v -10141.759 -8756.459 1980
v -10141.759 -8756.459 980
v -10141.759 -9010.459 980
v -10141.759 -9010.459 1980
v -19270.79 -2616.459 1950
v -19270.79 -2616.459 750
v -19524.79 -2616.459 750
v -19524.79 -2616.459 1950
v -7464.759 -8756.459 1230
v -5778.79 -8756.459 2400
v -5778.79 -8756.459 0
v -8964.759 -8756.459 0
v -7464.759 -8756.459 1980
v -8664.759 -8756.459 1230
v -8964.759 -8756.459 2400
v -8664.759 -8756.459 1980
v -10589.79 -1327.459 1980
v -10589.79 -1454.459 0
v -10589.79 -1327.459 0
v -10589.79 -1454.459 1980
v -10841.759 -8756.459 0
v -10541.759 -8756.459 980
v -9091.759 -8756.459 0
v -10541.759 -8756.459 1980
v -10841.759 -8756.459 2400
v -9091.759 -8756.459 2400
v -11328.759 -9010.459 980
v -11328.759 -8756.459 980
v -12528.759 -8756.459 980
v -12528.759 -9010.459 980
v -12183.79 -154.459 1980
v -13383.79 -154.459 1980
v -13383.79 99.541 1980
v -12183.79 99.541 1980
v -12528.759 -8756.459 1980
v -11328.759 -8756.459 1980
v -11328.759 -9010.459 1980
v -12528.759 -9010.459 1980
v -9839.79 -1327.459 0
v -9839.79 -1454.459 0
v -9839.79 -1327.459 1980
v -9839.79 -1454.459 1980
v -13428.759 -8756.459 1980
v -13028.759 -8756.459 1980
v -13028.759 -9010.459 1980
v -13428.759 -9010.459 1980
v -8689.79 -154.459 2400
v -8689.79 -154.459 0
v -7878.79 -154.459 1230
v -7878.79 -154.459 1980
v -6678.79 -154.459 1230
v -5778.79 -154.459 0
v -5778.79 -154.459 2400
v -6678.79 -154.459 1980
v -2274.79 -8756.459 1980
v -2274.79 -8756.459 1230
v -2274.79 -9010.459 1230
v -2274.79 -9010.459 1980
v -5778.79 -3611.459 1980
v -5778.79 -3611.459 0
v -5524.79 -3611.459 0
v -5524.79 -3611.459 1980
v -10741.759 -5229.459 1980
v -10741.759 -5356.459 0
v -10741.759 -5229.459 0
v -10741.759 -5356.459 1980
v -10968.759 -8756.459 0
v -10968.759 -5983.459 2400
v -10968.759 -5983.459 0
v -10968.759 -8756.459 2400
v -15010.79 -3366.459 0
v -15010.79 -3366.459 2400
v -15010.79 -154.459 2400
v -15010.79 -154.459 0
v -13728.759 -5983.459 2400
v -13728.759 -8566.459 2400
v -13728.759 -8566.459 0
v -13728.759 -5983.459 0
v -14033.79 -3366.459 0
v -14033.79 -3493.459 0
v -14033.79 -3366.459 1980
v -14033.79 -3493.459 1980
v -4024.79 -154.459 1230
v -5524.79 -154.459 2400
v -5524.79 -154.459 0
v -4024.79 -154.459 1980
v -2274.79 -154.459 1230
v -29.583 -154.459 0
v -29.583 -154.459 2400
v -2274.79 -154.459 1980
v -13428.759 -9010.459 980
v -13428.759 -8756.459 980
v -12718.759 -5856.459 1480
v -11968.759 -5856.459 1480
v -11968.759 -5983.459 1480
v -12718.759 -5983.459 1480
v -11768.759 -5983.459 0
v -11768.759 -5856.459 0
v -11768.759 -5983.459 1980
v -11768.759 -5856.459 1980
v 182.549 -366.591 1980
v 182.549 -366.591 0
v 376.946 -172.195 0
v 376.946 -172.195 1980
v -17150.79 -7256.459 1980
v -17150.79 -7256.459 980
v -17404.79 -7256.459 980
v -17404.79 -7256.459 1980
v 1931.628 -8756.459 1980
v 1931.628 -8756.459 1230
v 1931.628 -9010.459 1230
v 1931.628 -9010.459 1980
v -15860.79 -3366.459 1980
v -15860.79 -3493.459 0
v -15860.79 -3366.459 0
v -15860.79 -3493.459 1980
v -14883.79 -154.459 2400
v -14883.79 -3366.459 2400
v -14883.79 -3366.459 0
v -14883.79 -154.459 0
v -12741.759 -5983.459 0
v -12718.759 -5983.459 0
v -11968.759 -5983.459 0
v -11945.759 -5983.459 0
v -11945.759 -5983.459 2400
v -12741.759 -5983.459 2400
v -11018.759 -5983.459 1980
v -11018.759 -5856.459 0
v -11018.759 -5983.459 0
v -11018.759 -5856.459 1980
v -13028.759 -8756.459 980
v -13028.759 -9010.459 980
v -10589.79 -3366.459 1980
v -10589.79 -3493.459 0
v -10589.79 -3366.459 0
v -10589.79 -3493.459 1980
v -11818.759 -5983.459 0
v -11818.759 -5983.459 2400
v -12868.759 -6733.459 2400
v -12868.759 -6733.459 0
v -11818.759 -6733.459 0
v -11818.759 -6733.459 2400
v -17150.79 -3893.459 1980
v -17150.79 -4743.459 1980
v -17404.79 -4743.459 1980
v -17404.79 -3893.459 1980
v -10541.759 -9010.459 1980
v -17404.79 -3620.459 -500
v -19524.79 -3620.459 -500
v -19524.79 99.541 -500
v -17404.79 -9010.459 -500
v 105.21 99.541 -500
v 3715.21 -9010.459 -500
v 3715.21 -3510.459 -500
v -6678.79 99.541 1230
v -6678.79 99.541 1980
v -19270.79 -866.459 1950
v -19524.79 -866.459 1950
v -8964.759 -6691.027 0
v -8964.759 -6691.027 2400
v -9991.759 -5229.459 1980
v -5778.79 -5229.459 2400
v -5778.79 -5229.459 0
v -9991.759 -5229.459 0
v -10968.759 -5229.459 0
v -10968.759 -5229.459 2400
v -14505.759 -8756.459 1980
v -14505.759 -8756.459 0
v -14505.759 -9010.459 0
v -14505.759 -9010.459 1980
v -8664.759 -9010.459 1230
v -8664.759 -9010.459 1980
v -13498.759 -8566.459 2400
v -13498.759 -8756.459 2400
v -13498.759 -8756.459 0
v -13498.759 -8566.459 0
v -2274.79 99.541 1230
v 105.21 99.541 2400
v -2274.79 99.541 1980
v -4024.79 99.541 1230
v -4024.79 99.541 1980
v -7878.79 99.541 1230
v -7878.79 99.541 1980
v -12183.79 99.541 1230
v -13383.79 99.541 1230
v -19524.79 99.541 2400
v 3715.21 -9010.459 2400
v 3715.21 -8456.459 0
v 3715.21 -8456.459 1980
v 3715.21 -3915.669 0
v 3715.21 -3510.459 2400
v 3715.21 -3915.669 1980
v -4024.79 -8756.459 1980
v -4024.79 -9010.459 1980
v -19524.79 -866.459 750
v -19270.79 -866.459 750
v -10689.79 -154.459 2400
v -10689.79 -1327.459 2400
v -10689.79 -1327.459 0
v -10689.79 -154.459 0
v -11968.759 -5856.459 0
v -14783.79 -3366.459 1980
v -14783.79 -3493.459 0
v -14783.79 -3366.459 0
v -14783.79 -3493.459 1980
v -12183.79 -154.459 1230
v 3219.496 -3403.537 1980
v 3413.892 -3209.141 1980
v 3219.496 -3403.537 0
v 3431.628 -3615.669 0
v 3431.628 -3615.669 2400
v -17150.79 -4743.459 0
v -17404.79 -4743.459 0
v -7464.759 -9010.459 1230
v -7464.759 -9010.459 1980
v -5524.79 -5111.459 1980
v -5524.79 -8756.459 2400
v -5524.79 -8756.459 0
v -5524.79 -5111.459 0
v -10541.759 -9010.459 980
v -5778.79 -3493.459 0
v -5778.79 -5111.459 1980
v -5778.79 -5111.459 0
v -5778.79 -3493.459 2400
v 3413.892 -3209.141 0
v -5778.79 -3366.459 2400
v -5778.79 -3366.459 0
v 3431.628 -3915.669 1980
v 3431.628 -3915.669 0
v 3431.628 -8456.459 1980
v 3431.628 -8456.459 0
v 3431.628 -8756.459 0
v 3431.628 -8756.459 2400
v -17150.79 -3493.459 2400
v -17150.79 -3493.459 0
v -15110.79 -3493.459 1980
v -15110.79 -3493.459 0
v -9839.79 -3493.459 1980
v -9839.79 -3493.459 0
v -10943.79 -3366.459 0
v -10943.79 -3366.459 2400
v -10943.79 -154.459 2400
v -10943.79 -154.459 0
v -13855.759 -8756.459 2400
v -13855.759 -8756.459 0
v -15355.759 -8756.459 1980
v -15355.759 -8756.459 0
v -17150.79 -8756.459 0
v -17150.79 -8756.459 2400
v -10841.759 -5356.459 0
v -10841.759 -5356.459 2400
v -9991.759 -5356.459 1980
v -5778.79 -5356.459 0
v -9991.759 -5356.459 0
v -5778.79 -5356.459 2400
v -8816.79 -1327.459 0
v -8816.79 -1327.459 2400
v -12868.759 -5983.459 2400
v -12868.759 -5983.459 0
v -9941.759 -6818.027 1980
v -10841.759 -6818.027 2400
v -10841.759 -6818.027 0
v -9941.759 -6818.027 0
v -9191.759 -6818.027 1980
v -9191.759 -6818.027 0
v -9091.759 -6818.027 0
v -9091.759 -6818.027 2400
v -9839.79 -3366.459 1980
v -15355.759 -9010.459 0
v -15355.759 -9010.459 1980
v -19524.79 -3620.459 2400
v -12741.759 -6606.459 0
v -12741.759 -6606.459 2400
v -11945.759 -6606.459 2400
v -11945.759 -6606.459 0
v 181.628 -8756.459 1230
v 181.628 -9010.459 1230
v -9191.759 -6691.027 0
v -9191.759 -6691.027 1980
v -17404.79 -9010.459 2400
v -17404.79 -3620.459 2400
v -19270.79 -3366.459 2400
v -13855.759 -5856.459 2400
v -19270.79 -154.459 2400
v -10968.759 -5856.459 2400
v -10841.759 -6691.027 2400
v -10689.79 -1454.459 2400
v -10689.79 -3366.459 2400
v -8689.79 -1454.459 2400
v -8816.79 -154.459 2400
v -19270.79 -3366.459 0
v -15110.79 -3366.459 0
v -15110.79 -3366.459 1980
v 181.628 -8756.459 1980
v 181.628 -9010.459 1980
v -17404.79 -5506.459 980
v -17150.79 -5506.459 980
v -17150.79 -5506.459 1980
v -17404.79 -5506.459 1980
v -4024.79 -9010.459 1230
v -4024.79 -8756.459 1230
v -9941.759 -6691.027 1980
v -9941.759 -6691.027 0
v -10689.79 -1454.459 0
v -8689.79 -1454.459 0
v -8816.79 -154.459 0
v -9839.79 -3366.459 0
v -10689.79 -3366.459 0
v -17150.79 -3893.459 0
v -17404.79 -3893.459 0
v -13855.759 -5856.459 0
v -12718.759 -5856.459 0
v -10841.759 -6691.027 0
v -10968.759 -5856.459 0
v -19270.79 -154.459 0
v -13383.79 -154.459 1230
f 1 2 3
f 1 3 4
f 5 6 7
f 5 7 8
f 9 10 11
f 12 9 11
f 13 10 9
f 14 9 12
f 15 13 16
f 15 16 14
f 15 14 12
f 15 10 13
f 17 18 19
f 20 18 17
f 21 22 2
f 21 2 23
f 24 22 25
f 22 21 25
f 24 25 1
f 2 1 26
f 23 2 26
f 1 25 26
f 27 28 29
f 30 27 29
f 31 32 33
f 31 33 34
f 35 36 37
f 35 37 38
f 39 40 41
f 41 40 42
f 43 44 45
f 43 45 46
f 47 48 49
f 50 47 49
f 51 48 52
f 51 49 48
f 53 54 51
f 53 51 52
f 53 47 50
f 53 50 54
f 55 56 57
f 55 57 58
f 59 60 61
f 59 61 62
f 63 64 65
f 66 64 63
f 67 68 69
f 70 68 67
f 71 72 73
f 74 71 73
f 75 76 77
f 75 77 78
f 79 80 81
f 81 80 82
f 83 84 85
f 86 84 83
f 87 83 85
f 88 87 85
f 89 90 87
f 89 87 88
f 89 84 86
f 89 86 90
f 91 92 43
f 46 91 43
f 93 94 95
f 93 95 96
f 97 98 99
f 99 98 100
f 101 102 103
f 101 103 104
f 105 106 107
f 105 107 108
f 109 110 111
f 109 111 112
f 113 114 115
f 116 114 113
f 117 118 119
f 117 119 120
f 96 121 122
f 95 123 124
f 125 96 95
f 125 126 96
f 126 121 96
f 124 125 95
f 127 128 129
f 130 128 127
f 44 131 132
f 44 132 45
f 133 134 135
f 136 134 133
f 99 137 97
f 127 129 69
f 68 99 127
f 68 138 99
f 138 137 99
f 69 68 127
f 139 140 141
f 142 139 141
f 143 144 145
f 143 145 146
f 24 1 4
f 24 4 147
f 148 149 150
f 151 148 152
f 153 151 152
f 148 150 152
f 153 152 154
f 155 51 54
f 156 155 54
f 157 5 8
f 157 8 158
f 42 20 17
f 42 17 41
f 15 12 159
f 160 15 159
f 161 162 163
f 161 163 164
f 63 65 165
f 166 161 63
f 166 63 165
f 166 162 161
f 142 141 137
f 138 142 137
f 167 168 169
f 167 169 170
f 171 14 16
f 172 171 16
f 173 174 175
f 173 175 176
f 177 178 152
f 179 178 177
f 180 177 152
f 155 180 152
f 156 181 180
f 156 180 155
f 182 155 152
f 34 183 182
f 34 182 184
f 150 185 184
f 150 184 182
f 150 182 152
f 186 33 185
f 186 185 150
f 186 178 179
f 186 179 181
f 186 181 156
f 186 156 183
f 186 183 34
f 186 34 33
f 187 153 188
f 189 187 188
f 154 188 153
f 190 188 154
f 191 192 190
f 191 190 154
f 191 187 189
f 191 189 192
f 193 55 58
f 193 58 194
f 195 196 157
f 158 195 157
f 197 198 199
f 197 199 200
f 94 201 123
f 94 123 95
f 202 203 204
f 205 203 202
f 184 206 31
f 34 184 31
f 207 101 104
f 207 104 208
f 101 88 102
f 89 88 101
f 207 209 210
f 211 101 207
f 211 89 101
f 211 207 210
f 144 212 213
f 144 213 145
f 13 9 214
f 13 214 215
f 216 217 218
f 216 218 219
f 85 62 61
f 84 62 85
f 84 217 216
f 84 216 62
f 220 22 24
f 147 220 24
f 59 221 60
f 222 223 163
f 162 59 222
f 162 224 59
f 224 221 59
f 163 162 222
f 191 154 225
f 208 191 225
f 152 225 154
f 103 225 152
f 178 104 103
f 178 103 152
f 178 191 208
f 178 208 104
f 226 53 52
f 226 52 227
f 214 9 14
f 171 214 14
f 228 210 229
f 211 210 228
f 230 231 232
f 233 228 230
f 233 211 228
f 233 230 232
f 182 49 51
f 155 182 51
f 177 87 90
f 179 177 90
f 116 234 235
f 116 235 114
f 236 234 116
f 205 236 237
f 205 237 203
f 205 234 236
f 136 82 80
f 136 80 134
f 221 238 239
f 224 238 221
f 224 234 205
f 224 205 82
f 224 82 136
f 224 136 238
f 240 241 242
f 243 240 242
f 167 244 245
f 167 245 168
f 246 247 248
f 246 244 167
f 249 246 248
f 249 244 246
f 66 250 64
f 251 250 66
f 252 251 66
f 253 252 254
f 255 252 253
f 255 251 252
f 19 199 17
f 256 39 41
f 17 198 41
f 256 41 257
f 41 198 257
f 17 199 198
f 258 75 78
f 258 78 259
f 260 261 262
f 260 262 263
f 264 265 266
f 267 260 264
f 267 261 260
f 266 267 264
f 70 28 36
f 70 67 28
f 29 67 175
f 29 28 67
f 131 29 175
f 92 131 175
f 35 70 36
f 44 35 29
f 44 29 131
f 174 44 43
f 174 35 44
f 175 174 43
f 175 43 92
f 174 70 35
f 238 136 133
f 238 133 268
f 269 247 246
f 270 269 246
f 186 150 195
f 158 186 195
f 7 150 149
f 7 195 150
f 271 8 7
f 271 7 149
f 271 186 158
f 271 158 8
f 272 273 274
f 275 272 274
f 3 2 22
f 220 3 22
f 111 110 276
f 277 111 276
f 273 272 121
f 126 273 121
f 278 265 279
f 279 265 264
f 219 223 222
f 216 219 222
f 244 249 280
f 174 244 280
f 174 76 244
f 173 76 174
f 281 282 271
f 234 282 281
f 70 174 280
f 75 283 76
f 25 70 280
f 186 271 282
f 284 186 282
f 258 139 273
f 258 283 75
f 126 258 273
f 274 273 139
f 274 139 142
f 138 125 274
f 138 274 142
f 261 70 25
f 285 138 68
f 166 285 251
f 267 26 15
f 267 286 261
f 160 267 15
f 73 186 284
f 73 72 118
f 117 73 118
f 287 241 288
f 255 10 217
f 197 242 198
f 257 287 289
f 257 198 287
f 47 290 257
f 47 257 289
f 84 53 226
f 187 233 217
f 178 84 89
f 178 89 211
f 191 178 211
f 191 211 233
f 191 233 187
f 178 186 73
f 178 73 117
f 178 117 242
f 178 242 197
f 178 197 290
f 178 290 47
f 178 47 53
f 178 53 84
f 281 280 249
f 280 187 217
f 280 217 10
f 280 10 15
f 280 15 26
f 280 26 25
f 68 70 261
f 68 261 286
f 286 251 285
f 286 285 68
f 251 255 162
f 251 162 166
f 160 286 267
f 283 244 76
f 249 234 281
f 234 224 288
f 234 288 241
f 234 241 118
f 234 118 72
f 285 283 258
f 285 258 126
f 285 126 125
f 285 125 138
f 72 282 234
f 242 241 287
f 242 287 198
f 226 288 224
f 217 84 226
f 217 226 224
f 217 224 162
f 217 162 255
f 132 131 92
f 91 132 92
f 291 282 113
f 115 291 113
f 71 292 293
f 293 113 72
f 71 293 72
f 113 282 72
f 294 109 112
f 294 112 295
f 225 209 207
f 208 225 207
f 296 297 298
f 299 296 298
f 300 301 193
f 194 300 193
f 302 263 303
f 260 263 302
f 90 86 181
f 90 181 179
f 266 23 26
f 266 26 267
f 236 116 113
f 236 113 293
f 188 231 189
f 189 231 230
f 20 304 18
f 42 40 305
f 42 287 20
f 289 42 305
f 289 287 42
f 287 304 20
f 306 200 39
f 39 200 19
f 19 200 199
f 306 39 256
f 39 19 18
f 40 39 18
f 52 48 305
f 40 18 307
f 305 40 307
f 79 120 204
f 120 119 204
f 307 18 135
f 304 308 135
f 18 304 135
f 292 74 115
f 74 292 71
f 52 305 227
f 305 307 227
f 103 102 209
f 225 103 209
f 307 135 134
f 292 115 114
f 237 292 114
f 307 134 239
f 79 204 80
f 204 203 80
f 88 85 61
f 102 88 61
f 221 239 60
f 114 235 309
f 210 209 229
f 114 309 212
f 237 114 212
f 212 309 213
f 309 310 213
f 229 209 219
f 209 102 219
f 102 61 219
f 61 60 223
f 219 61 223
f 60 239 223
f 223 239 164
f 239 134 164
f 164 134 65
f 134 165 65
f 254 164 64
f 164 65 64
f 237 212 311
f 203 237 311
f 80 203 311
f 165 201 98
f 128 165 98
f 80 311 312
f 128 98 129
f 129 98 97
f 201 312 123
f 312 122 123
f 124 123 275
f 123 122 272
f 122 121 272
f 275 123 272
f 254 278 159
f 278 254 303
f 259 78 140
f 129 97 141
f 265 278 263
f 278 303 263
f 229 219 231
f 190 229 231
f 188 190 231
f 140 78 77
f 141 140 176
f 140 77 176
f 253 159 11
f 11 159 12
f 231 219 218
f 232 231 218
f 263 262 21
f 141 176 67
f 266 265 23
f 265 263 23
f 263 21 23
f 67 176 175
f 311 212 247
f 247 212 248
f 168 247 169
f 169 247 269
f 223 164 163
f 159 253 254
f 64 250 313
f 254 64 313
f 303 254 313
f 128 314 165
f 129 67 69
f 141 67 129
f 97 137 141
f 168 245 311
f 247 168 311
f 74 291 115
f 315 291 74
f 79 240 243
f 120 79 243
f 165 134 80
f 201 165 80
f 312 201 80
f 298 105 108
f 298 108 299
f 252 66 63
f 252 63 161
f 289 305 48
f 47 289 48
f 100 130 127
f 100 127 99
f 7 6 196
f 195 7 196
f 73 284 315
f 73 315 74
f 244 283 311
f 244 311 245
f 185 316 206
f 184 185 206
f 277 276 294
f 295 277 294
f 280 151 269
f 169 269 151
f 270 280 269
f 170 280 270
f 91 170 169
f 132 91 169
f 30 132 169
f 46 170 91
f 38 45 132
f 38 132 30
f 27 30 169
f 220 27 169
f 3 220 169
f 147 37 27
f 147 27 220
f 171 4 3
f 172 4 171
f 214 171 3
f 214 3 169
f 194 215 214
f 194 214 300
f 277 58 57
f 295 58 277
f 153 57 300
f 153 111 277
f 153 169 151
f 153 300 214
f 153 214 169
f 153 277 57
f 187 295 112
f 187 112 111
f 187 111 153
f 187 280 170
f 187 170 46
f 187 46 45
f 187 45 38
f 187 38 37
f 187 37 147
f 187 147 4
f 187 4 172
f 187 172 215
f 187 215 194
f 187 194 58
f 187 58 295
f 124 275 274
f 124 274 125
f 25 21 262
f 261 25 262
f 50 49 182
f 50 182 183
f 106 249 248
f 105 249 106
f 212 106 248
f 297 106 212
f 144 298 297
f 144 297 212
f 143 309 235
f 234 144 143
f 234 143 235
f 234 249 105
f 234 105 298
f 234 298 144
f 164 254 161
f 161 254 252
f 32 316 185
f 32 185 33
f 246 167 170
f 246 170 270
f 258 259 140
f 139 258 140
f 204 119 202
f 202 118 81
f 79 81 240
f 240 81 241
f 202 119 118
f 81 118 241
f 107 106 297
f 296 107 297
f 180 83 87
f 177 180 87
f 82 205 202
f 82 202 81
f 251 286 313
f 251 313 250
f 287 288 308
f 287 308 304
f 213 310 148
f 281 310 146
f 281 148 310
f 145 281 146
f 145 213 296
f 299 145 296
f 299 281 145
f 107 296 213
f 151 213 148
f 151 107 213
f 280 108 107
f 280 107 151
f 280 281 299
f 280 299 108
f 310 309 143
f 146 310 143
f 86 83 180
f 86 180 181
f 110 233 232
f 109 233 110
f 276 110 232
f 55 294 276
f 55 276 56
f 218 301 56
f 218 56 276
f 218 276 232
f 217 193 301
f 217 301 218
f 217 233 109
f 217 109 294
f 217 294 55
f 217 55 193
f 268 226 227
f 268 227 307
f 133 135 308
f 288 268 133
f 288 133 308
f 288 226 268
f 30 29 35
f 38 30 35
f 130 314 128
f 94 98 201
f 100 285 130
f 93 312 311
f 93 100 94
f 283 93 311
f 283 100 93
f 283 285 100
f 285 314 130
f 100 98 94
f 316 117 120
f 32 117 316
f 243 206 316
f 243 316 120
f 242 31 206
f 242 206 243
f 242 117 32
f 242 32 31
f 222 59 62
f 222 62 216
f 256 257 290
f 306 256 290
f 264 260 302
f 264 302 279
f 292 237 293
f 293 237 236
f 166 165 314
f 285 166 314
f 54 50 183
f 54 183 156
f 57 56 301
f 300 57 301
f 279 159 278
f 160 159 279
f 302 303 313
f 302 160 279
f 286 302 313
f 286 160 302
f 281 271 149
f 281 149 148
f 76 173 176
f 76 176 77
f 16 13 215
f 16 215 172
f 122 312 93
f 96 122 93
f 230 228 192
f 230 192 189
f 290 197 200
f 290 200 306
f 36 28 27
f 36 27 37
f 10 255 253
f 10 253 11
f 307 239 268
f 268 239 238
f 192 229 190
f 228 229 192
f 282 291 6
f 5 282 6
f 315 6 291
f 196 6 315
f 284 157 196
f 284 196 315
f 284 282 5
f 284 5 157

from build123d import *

# Parameters (mm, degrees)
F0_W          = 1750
F0_H          = 1938.4325688744
F0_W_2        = 796
F0_H_2        = 623
F0_W_3        = 4260
F0_H_3        = 3212
F0_W_4        = 3940
F0_W_5        = 1873
F0_H_4        = 1173
F1_DEPTH      = 2400
F1_DEPTH_BACK = 500
F2_W          = 750
F2_H          = 1980
F3_DEPTH      = 250
F4_W          = 750
F4_H          = 1980
F5_DEPTH      = 500
F6_W          = 750
F6_H          = 1980
F7_DEPTH      = 500
F8_W          = 1500
F8_H          = 1980
F9_DEPTH      = 500
F12_DEPTH     = 500
F13_W         = 750
F13_H         = 1980
F14_DEPTH     = 500
F15_W         = 1750
F15_H         = 1000
F15_W_2       = 850
F15_H_2       = 1980
F16_DEPTH     = 2374.001
F17_W         = 1750
F17_H         = 1200
F18_DEPTH     = 254.001
F19_W         = 850
F19_H         = 1980
F20_DEPTH     = 254.001
F21_W         = 400
F21_H         = 1000
F21_W_2       = 1200
F21_H_2       = 750
F21_W_3       = 1750
F22_DEPTH     = 254.001
F23_W         = 1200
F23_H         = 750
F23_W_2       = 1750
F24_DEPTH     = 254.001
F25_W         = 4294.8904704813
F25_H         = 1980
F26_DEPTH     = 2827.5745303553
F27_W         = 4540.7897551572
F27_H         = 1980
F28_DEPTH     = 283.5835903928
F29_W         = 750
F29_H         = 1980
F30_DEPTH     = 500


# Not quite as in the source:
# - a feature names something its author has since deleted; it is built from what else it names


with BuildPart() as f1:
    # F0 (on Top) → F1 (new body, two sides)
    with BuildSketch(Plane.XY) as f1_sk:
        Polygon((105.2102448428, 99.540888462), (-19524.7897551572, 99.540888462), (-19524.7897551572, -3620.459111538), (-17404.7897551572, -3620.459111538), (-17404.7897551572, -9010.459111538), (3715.2102448428, -9010.459111538), (3715.2102448428, -3510.459111538), align=None)
        Polygon((-13498.7586669922, -8566.459111538), (-13728.7586669922, -8566.459111538), (-13728.7586669922, -5983.459111538), (-12868.7586669922, -5983.459111538), (-12868.7586669922, -6733.459111538), (-11818.7586669922, -6733.459111538), (-11818.7586669922, -5983.459111538), (-10968.7586669922, -5983.459111538), (-10968.7586669922, -8756.459111538), (-13498.7586669922, -8756.459111538), align=None, mode=Mode.SUBTRACT)
        with Locations((-9966.7586669922, -7787.2428271008)):
            Rectangle(F0_W, F0_H, mode=Mode.SUBTRACT)
        Polygon((-10841.7586669922, -5356.459111538), (-5778.7897551572, -5356.459111538), (-5778.7897551572, -8756.459111538), (-8964.7586669922, -8756.459111538), (-8964.7586669922, -6691.0265426636), (-10841.7586669922, -6691.0265426636), align=None, mode=Mode.SUBTRACT)
        with Locations((-12343.7586669922, -6294.959111538)):
            Rectangle(F0_W_2, F0_H_2, mode=Mode.SUBTRACT)
        Polygon((-13855.7586669922, -8756.459111538), (-17150.7897551572, -8756.459111538), (-17150.7897551572, -3493.459111538), (-5778.7897551572, -3493.459111538), (-5778.7897551572, -5229.459111538), (-10968.7586669922, -5229.459111538), (-10968.7586669922, -5856.459111538), (-13855.7586669922, -5856.459111538), align=None, mode=Mode.SUBTRACT)
        Polygon((-5524.7897551572, -8756.459111538), (-5524.7897551572, -154.459111538), (-29.5825903928, -154.459111538), (3431.6276544499, -3615.6693563807), (3431.6276544499, -8756.459111538), align=None, mode=Mode.SUBTRACT)
        with Locations((-17140.7897551572, -1760.459111538)):
            Rectangle(F0_W_3, F0_H_3, mode=Mode.SUBTRACT)
        with Locations((-12913.7897551572, -1760.459111538)):
            Rectangle(F0_W_4, F0_H_3, mode=Mode.SUBTRACT)
        Polygon((-8689.7897551572, -154.459111538), (-5778.7897551572, -154.459111538), (-5778.7897551572, -3366.459111538), (-10689.7897551572, -3366.459111538), (-10689.7897551572, -1454.459111538), (-8689.7897551572, -1454.459111538), align=None, mode=Mode.SUBTRACT)
        with Locations((-9753.2897551572, -740.959111538)):
            Rectangle(F0_W_5, F0_H_4, mode=Mode.SUBTRACT)
    extrude(amount=F1_DEPTH)
    extrude(f1_sk.sketch, amount=-F1_DEPTH_BACK)

    # F2 (on face) → F3 (cut)
    with BuildSketch(Plane(origin=(0, -5856.459111538, 0), x_dir=(-1, 0, 0), z_dir=(0, 1, 0))):
        with Locations((11393.7586669922, 990)):
            Rectangle(F2_W, F2_H)
        with Locations((12343.7586669922, 490)):
            Rectangle(F2_W, F2_H)
    extrude(amount=-F3_DEPTH, mode=Mode.SUBTRACT)

    # F4 (on face) → F5 (cut)
    with BuildSketch(Plane.XZ.offset(3493.459111538)):
        with Locations((-15485.7897551572, 990)):
            Rectangle(F4_W, F4_H)
        with Locations((-14408.7897551572, 990)):
            Rectangle(F4_W, F4_H)
        with Locations((-10214.7897551572, 990)):
            Rectangle(F4_W, F4_H)
    extrude(amount=-F5_DEPTH, mode=Mode.SUBTRACT)

    # F6 (on face) → F7 (cut)
    with BuildSketch(Plane.XZ.offset(5356.459111538)):
        with Locations((-10366.7586669922, 990)):
            Rectangle(F6_W, F6_H)
    extrude(amount=-F7_DEPTH, mode=Mode.SUBTRACT)

    # F8 (on face) → F9 (cut)
    with BuildSketch(Plane(origin=(-5778.7897551572, 0, 0), x_dir=(0, -1, 0), z_dir=(-1, 0, 0))):
        with Locations((4361.459111538, 990)):
            Rectangle(F8_W, F8_H)
    extrude(amount=-F9_DEPTH, mode=Mode.SUBTRACT)

    # F11 (on face) → F12 (join)
    with BuildSketch(Plane(origin=(0, 0, -500), x_dir=(1, 0, 0), z_dir=(0, 0, -1))):
        Polygon((3715.2102448428, 3510.459111538), (3715.2102448428, 9010.459111538), (-17404.7897551572, 9010.459111538), (-17404.7897551572, 3620.459111538), (-19524.7897551572, 3620.459111538), (-19524.7897551572, -99.540888462), (105.2102448428, -99.540888462), align=None)
    extrude(amount=-F12_DEPTH)

    # F13 (on face) → F14 (cut)
    with BuildSketch(Plane.XZ.offset(6818.0265426636)):
        with Locations((-9566.7586669922, 990)):
            Rectangle(F13_W, F13_H)
    extrude(amount=-F14_DEPTH, mode=Mode.SUBTRACT)

    # F15 (on face) → F16 (cut, through all)
    with BuildSketch(Plane.YZ.offset(-17150.7897551572)):
        with Locations((-6381.459111538, 1480)):
            Rectangle(F15_W, F15_H)
        with Locations((-4318.459111538, 990)):
            Rectangle(F15_W_2, F15_H_2)
    extrude(amount=-F16_DEPTH, mode=Mode.SUBTRACT)

    # F17 (on face) → F18 (cut, through all)
    with BuildSketch(Plane.YZ.offset(-19270.7897551572)):
        with Locations((-1741.459111538, 1350)):
            Rectangle(F17_W, F17_H)
    extrude(amount=-F18_DEPTH, mode=Mode.SUBTRACT)

    # F19 (on face) → F20 (cut, through all)
    with BuildSketch(Plane(origin=(0, -8756.459111538, 0), x_dir=(-1, 0, 0), z_dir=(0, 1, 0))):
        with Locations((14930.7586669922, 990)):
            Rectangle(F19_W, F19_H)
    extrude(amount=-F20_DEPTH, mode=Mode.SUBTRACT)

    # F21 (on face) → F22 (cut, through all)
    with BuildSketch(Plane(origin=(0, -8756.459111538, 0), x_dir=(-1, 0, 0), z_dir=(0, 1, 0))):
        with Locations((13228.7586669922, 1480)):
            Rectangle(F21_W, F21_H)
        with Locations((11928.7586669922, 1480)):
            Rectangle(F21_W_2, F21_H)
        with Locations((10341.7586669922, 1480)):
            Rectangle(F21_W, F21_H)
        with Locations((8064.7586669922, 1605)):
            Rectangle(F21_W_2, F21_H_2)
        with Locations((3149.7897551572, 1605)):
            Rectangle(F21_W_3, F21_H_2)
        with Locations((-1056.6276544499, 1605)):
            Rectangle(F21_W_3, F21_H_2)
    extrude(amount=-F22_DEPTH, mode=Mode.SUBTRACT)

    # F23 (on face) → F24 (cut, through all)
    with BuildSketch(Plane.XZ.offset(154.459111538)):
        with Locations((-12783.7897551572, 1605)):
            Rectangle(F23_W, F23_H)
        with Locations((-7278.7897551572, 1605)):
            Rectangle(F23_W, F23_H)
        with Locations((-3149.7897551572, 1605)):
            Rectangle(F23_W_2, F23_H)
    extrude(amount=-F24_DEPTH, mode=Mode.SUBTRACT)

    # F25 (on face) → F26 (cut, through all)
    with BuildSketch(Plane(origin=(-92.0208509654, -92.0208509654, 0), x_dir=(0.7071067812, -0.7071067812, 0), z_dir=(-0.7071067812, -0.7071067812, 0))):
        with Locations((2535.7462701534, 990)):
            Rectangle(F25_W, F25_H)
    extrude(amount=-F26_DEPTH, mode=Mode.SUBTRACT)

    # F27 (on face) → F28 (cut, through all)
    with BuildSketch(Plane(origin=(3431.6276544499, 0, 0), x_dir=(0, -1, 0), z_dir=(-1, 0, 0))):
        with Locations((6186.0642339594, 990)):
            Rectangle(F27_W, F27_H)
    extrude(amount=-F28_DEPTH, mode=Mode.SUBTRACT)

    # F29 (on face) → F30 (cut)
    with BuildSketch(Plane.XZ.offset(1454.459111538)):
        with Locations((-10214.7897551572, 990)):
            Rectangle(F29_W, F29_H)
    extrude(amount=-F30_DEPTH, mode=Mode.SUBTRACT)


solid = f1.part
